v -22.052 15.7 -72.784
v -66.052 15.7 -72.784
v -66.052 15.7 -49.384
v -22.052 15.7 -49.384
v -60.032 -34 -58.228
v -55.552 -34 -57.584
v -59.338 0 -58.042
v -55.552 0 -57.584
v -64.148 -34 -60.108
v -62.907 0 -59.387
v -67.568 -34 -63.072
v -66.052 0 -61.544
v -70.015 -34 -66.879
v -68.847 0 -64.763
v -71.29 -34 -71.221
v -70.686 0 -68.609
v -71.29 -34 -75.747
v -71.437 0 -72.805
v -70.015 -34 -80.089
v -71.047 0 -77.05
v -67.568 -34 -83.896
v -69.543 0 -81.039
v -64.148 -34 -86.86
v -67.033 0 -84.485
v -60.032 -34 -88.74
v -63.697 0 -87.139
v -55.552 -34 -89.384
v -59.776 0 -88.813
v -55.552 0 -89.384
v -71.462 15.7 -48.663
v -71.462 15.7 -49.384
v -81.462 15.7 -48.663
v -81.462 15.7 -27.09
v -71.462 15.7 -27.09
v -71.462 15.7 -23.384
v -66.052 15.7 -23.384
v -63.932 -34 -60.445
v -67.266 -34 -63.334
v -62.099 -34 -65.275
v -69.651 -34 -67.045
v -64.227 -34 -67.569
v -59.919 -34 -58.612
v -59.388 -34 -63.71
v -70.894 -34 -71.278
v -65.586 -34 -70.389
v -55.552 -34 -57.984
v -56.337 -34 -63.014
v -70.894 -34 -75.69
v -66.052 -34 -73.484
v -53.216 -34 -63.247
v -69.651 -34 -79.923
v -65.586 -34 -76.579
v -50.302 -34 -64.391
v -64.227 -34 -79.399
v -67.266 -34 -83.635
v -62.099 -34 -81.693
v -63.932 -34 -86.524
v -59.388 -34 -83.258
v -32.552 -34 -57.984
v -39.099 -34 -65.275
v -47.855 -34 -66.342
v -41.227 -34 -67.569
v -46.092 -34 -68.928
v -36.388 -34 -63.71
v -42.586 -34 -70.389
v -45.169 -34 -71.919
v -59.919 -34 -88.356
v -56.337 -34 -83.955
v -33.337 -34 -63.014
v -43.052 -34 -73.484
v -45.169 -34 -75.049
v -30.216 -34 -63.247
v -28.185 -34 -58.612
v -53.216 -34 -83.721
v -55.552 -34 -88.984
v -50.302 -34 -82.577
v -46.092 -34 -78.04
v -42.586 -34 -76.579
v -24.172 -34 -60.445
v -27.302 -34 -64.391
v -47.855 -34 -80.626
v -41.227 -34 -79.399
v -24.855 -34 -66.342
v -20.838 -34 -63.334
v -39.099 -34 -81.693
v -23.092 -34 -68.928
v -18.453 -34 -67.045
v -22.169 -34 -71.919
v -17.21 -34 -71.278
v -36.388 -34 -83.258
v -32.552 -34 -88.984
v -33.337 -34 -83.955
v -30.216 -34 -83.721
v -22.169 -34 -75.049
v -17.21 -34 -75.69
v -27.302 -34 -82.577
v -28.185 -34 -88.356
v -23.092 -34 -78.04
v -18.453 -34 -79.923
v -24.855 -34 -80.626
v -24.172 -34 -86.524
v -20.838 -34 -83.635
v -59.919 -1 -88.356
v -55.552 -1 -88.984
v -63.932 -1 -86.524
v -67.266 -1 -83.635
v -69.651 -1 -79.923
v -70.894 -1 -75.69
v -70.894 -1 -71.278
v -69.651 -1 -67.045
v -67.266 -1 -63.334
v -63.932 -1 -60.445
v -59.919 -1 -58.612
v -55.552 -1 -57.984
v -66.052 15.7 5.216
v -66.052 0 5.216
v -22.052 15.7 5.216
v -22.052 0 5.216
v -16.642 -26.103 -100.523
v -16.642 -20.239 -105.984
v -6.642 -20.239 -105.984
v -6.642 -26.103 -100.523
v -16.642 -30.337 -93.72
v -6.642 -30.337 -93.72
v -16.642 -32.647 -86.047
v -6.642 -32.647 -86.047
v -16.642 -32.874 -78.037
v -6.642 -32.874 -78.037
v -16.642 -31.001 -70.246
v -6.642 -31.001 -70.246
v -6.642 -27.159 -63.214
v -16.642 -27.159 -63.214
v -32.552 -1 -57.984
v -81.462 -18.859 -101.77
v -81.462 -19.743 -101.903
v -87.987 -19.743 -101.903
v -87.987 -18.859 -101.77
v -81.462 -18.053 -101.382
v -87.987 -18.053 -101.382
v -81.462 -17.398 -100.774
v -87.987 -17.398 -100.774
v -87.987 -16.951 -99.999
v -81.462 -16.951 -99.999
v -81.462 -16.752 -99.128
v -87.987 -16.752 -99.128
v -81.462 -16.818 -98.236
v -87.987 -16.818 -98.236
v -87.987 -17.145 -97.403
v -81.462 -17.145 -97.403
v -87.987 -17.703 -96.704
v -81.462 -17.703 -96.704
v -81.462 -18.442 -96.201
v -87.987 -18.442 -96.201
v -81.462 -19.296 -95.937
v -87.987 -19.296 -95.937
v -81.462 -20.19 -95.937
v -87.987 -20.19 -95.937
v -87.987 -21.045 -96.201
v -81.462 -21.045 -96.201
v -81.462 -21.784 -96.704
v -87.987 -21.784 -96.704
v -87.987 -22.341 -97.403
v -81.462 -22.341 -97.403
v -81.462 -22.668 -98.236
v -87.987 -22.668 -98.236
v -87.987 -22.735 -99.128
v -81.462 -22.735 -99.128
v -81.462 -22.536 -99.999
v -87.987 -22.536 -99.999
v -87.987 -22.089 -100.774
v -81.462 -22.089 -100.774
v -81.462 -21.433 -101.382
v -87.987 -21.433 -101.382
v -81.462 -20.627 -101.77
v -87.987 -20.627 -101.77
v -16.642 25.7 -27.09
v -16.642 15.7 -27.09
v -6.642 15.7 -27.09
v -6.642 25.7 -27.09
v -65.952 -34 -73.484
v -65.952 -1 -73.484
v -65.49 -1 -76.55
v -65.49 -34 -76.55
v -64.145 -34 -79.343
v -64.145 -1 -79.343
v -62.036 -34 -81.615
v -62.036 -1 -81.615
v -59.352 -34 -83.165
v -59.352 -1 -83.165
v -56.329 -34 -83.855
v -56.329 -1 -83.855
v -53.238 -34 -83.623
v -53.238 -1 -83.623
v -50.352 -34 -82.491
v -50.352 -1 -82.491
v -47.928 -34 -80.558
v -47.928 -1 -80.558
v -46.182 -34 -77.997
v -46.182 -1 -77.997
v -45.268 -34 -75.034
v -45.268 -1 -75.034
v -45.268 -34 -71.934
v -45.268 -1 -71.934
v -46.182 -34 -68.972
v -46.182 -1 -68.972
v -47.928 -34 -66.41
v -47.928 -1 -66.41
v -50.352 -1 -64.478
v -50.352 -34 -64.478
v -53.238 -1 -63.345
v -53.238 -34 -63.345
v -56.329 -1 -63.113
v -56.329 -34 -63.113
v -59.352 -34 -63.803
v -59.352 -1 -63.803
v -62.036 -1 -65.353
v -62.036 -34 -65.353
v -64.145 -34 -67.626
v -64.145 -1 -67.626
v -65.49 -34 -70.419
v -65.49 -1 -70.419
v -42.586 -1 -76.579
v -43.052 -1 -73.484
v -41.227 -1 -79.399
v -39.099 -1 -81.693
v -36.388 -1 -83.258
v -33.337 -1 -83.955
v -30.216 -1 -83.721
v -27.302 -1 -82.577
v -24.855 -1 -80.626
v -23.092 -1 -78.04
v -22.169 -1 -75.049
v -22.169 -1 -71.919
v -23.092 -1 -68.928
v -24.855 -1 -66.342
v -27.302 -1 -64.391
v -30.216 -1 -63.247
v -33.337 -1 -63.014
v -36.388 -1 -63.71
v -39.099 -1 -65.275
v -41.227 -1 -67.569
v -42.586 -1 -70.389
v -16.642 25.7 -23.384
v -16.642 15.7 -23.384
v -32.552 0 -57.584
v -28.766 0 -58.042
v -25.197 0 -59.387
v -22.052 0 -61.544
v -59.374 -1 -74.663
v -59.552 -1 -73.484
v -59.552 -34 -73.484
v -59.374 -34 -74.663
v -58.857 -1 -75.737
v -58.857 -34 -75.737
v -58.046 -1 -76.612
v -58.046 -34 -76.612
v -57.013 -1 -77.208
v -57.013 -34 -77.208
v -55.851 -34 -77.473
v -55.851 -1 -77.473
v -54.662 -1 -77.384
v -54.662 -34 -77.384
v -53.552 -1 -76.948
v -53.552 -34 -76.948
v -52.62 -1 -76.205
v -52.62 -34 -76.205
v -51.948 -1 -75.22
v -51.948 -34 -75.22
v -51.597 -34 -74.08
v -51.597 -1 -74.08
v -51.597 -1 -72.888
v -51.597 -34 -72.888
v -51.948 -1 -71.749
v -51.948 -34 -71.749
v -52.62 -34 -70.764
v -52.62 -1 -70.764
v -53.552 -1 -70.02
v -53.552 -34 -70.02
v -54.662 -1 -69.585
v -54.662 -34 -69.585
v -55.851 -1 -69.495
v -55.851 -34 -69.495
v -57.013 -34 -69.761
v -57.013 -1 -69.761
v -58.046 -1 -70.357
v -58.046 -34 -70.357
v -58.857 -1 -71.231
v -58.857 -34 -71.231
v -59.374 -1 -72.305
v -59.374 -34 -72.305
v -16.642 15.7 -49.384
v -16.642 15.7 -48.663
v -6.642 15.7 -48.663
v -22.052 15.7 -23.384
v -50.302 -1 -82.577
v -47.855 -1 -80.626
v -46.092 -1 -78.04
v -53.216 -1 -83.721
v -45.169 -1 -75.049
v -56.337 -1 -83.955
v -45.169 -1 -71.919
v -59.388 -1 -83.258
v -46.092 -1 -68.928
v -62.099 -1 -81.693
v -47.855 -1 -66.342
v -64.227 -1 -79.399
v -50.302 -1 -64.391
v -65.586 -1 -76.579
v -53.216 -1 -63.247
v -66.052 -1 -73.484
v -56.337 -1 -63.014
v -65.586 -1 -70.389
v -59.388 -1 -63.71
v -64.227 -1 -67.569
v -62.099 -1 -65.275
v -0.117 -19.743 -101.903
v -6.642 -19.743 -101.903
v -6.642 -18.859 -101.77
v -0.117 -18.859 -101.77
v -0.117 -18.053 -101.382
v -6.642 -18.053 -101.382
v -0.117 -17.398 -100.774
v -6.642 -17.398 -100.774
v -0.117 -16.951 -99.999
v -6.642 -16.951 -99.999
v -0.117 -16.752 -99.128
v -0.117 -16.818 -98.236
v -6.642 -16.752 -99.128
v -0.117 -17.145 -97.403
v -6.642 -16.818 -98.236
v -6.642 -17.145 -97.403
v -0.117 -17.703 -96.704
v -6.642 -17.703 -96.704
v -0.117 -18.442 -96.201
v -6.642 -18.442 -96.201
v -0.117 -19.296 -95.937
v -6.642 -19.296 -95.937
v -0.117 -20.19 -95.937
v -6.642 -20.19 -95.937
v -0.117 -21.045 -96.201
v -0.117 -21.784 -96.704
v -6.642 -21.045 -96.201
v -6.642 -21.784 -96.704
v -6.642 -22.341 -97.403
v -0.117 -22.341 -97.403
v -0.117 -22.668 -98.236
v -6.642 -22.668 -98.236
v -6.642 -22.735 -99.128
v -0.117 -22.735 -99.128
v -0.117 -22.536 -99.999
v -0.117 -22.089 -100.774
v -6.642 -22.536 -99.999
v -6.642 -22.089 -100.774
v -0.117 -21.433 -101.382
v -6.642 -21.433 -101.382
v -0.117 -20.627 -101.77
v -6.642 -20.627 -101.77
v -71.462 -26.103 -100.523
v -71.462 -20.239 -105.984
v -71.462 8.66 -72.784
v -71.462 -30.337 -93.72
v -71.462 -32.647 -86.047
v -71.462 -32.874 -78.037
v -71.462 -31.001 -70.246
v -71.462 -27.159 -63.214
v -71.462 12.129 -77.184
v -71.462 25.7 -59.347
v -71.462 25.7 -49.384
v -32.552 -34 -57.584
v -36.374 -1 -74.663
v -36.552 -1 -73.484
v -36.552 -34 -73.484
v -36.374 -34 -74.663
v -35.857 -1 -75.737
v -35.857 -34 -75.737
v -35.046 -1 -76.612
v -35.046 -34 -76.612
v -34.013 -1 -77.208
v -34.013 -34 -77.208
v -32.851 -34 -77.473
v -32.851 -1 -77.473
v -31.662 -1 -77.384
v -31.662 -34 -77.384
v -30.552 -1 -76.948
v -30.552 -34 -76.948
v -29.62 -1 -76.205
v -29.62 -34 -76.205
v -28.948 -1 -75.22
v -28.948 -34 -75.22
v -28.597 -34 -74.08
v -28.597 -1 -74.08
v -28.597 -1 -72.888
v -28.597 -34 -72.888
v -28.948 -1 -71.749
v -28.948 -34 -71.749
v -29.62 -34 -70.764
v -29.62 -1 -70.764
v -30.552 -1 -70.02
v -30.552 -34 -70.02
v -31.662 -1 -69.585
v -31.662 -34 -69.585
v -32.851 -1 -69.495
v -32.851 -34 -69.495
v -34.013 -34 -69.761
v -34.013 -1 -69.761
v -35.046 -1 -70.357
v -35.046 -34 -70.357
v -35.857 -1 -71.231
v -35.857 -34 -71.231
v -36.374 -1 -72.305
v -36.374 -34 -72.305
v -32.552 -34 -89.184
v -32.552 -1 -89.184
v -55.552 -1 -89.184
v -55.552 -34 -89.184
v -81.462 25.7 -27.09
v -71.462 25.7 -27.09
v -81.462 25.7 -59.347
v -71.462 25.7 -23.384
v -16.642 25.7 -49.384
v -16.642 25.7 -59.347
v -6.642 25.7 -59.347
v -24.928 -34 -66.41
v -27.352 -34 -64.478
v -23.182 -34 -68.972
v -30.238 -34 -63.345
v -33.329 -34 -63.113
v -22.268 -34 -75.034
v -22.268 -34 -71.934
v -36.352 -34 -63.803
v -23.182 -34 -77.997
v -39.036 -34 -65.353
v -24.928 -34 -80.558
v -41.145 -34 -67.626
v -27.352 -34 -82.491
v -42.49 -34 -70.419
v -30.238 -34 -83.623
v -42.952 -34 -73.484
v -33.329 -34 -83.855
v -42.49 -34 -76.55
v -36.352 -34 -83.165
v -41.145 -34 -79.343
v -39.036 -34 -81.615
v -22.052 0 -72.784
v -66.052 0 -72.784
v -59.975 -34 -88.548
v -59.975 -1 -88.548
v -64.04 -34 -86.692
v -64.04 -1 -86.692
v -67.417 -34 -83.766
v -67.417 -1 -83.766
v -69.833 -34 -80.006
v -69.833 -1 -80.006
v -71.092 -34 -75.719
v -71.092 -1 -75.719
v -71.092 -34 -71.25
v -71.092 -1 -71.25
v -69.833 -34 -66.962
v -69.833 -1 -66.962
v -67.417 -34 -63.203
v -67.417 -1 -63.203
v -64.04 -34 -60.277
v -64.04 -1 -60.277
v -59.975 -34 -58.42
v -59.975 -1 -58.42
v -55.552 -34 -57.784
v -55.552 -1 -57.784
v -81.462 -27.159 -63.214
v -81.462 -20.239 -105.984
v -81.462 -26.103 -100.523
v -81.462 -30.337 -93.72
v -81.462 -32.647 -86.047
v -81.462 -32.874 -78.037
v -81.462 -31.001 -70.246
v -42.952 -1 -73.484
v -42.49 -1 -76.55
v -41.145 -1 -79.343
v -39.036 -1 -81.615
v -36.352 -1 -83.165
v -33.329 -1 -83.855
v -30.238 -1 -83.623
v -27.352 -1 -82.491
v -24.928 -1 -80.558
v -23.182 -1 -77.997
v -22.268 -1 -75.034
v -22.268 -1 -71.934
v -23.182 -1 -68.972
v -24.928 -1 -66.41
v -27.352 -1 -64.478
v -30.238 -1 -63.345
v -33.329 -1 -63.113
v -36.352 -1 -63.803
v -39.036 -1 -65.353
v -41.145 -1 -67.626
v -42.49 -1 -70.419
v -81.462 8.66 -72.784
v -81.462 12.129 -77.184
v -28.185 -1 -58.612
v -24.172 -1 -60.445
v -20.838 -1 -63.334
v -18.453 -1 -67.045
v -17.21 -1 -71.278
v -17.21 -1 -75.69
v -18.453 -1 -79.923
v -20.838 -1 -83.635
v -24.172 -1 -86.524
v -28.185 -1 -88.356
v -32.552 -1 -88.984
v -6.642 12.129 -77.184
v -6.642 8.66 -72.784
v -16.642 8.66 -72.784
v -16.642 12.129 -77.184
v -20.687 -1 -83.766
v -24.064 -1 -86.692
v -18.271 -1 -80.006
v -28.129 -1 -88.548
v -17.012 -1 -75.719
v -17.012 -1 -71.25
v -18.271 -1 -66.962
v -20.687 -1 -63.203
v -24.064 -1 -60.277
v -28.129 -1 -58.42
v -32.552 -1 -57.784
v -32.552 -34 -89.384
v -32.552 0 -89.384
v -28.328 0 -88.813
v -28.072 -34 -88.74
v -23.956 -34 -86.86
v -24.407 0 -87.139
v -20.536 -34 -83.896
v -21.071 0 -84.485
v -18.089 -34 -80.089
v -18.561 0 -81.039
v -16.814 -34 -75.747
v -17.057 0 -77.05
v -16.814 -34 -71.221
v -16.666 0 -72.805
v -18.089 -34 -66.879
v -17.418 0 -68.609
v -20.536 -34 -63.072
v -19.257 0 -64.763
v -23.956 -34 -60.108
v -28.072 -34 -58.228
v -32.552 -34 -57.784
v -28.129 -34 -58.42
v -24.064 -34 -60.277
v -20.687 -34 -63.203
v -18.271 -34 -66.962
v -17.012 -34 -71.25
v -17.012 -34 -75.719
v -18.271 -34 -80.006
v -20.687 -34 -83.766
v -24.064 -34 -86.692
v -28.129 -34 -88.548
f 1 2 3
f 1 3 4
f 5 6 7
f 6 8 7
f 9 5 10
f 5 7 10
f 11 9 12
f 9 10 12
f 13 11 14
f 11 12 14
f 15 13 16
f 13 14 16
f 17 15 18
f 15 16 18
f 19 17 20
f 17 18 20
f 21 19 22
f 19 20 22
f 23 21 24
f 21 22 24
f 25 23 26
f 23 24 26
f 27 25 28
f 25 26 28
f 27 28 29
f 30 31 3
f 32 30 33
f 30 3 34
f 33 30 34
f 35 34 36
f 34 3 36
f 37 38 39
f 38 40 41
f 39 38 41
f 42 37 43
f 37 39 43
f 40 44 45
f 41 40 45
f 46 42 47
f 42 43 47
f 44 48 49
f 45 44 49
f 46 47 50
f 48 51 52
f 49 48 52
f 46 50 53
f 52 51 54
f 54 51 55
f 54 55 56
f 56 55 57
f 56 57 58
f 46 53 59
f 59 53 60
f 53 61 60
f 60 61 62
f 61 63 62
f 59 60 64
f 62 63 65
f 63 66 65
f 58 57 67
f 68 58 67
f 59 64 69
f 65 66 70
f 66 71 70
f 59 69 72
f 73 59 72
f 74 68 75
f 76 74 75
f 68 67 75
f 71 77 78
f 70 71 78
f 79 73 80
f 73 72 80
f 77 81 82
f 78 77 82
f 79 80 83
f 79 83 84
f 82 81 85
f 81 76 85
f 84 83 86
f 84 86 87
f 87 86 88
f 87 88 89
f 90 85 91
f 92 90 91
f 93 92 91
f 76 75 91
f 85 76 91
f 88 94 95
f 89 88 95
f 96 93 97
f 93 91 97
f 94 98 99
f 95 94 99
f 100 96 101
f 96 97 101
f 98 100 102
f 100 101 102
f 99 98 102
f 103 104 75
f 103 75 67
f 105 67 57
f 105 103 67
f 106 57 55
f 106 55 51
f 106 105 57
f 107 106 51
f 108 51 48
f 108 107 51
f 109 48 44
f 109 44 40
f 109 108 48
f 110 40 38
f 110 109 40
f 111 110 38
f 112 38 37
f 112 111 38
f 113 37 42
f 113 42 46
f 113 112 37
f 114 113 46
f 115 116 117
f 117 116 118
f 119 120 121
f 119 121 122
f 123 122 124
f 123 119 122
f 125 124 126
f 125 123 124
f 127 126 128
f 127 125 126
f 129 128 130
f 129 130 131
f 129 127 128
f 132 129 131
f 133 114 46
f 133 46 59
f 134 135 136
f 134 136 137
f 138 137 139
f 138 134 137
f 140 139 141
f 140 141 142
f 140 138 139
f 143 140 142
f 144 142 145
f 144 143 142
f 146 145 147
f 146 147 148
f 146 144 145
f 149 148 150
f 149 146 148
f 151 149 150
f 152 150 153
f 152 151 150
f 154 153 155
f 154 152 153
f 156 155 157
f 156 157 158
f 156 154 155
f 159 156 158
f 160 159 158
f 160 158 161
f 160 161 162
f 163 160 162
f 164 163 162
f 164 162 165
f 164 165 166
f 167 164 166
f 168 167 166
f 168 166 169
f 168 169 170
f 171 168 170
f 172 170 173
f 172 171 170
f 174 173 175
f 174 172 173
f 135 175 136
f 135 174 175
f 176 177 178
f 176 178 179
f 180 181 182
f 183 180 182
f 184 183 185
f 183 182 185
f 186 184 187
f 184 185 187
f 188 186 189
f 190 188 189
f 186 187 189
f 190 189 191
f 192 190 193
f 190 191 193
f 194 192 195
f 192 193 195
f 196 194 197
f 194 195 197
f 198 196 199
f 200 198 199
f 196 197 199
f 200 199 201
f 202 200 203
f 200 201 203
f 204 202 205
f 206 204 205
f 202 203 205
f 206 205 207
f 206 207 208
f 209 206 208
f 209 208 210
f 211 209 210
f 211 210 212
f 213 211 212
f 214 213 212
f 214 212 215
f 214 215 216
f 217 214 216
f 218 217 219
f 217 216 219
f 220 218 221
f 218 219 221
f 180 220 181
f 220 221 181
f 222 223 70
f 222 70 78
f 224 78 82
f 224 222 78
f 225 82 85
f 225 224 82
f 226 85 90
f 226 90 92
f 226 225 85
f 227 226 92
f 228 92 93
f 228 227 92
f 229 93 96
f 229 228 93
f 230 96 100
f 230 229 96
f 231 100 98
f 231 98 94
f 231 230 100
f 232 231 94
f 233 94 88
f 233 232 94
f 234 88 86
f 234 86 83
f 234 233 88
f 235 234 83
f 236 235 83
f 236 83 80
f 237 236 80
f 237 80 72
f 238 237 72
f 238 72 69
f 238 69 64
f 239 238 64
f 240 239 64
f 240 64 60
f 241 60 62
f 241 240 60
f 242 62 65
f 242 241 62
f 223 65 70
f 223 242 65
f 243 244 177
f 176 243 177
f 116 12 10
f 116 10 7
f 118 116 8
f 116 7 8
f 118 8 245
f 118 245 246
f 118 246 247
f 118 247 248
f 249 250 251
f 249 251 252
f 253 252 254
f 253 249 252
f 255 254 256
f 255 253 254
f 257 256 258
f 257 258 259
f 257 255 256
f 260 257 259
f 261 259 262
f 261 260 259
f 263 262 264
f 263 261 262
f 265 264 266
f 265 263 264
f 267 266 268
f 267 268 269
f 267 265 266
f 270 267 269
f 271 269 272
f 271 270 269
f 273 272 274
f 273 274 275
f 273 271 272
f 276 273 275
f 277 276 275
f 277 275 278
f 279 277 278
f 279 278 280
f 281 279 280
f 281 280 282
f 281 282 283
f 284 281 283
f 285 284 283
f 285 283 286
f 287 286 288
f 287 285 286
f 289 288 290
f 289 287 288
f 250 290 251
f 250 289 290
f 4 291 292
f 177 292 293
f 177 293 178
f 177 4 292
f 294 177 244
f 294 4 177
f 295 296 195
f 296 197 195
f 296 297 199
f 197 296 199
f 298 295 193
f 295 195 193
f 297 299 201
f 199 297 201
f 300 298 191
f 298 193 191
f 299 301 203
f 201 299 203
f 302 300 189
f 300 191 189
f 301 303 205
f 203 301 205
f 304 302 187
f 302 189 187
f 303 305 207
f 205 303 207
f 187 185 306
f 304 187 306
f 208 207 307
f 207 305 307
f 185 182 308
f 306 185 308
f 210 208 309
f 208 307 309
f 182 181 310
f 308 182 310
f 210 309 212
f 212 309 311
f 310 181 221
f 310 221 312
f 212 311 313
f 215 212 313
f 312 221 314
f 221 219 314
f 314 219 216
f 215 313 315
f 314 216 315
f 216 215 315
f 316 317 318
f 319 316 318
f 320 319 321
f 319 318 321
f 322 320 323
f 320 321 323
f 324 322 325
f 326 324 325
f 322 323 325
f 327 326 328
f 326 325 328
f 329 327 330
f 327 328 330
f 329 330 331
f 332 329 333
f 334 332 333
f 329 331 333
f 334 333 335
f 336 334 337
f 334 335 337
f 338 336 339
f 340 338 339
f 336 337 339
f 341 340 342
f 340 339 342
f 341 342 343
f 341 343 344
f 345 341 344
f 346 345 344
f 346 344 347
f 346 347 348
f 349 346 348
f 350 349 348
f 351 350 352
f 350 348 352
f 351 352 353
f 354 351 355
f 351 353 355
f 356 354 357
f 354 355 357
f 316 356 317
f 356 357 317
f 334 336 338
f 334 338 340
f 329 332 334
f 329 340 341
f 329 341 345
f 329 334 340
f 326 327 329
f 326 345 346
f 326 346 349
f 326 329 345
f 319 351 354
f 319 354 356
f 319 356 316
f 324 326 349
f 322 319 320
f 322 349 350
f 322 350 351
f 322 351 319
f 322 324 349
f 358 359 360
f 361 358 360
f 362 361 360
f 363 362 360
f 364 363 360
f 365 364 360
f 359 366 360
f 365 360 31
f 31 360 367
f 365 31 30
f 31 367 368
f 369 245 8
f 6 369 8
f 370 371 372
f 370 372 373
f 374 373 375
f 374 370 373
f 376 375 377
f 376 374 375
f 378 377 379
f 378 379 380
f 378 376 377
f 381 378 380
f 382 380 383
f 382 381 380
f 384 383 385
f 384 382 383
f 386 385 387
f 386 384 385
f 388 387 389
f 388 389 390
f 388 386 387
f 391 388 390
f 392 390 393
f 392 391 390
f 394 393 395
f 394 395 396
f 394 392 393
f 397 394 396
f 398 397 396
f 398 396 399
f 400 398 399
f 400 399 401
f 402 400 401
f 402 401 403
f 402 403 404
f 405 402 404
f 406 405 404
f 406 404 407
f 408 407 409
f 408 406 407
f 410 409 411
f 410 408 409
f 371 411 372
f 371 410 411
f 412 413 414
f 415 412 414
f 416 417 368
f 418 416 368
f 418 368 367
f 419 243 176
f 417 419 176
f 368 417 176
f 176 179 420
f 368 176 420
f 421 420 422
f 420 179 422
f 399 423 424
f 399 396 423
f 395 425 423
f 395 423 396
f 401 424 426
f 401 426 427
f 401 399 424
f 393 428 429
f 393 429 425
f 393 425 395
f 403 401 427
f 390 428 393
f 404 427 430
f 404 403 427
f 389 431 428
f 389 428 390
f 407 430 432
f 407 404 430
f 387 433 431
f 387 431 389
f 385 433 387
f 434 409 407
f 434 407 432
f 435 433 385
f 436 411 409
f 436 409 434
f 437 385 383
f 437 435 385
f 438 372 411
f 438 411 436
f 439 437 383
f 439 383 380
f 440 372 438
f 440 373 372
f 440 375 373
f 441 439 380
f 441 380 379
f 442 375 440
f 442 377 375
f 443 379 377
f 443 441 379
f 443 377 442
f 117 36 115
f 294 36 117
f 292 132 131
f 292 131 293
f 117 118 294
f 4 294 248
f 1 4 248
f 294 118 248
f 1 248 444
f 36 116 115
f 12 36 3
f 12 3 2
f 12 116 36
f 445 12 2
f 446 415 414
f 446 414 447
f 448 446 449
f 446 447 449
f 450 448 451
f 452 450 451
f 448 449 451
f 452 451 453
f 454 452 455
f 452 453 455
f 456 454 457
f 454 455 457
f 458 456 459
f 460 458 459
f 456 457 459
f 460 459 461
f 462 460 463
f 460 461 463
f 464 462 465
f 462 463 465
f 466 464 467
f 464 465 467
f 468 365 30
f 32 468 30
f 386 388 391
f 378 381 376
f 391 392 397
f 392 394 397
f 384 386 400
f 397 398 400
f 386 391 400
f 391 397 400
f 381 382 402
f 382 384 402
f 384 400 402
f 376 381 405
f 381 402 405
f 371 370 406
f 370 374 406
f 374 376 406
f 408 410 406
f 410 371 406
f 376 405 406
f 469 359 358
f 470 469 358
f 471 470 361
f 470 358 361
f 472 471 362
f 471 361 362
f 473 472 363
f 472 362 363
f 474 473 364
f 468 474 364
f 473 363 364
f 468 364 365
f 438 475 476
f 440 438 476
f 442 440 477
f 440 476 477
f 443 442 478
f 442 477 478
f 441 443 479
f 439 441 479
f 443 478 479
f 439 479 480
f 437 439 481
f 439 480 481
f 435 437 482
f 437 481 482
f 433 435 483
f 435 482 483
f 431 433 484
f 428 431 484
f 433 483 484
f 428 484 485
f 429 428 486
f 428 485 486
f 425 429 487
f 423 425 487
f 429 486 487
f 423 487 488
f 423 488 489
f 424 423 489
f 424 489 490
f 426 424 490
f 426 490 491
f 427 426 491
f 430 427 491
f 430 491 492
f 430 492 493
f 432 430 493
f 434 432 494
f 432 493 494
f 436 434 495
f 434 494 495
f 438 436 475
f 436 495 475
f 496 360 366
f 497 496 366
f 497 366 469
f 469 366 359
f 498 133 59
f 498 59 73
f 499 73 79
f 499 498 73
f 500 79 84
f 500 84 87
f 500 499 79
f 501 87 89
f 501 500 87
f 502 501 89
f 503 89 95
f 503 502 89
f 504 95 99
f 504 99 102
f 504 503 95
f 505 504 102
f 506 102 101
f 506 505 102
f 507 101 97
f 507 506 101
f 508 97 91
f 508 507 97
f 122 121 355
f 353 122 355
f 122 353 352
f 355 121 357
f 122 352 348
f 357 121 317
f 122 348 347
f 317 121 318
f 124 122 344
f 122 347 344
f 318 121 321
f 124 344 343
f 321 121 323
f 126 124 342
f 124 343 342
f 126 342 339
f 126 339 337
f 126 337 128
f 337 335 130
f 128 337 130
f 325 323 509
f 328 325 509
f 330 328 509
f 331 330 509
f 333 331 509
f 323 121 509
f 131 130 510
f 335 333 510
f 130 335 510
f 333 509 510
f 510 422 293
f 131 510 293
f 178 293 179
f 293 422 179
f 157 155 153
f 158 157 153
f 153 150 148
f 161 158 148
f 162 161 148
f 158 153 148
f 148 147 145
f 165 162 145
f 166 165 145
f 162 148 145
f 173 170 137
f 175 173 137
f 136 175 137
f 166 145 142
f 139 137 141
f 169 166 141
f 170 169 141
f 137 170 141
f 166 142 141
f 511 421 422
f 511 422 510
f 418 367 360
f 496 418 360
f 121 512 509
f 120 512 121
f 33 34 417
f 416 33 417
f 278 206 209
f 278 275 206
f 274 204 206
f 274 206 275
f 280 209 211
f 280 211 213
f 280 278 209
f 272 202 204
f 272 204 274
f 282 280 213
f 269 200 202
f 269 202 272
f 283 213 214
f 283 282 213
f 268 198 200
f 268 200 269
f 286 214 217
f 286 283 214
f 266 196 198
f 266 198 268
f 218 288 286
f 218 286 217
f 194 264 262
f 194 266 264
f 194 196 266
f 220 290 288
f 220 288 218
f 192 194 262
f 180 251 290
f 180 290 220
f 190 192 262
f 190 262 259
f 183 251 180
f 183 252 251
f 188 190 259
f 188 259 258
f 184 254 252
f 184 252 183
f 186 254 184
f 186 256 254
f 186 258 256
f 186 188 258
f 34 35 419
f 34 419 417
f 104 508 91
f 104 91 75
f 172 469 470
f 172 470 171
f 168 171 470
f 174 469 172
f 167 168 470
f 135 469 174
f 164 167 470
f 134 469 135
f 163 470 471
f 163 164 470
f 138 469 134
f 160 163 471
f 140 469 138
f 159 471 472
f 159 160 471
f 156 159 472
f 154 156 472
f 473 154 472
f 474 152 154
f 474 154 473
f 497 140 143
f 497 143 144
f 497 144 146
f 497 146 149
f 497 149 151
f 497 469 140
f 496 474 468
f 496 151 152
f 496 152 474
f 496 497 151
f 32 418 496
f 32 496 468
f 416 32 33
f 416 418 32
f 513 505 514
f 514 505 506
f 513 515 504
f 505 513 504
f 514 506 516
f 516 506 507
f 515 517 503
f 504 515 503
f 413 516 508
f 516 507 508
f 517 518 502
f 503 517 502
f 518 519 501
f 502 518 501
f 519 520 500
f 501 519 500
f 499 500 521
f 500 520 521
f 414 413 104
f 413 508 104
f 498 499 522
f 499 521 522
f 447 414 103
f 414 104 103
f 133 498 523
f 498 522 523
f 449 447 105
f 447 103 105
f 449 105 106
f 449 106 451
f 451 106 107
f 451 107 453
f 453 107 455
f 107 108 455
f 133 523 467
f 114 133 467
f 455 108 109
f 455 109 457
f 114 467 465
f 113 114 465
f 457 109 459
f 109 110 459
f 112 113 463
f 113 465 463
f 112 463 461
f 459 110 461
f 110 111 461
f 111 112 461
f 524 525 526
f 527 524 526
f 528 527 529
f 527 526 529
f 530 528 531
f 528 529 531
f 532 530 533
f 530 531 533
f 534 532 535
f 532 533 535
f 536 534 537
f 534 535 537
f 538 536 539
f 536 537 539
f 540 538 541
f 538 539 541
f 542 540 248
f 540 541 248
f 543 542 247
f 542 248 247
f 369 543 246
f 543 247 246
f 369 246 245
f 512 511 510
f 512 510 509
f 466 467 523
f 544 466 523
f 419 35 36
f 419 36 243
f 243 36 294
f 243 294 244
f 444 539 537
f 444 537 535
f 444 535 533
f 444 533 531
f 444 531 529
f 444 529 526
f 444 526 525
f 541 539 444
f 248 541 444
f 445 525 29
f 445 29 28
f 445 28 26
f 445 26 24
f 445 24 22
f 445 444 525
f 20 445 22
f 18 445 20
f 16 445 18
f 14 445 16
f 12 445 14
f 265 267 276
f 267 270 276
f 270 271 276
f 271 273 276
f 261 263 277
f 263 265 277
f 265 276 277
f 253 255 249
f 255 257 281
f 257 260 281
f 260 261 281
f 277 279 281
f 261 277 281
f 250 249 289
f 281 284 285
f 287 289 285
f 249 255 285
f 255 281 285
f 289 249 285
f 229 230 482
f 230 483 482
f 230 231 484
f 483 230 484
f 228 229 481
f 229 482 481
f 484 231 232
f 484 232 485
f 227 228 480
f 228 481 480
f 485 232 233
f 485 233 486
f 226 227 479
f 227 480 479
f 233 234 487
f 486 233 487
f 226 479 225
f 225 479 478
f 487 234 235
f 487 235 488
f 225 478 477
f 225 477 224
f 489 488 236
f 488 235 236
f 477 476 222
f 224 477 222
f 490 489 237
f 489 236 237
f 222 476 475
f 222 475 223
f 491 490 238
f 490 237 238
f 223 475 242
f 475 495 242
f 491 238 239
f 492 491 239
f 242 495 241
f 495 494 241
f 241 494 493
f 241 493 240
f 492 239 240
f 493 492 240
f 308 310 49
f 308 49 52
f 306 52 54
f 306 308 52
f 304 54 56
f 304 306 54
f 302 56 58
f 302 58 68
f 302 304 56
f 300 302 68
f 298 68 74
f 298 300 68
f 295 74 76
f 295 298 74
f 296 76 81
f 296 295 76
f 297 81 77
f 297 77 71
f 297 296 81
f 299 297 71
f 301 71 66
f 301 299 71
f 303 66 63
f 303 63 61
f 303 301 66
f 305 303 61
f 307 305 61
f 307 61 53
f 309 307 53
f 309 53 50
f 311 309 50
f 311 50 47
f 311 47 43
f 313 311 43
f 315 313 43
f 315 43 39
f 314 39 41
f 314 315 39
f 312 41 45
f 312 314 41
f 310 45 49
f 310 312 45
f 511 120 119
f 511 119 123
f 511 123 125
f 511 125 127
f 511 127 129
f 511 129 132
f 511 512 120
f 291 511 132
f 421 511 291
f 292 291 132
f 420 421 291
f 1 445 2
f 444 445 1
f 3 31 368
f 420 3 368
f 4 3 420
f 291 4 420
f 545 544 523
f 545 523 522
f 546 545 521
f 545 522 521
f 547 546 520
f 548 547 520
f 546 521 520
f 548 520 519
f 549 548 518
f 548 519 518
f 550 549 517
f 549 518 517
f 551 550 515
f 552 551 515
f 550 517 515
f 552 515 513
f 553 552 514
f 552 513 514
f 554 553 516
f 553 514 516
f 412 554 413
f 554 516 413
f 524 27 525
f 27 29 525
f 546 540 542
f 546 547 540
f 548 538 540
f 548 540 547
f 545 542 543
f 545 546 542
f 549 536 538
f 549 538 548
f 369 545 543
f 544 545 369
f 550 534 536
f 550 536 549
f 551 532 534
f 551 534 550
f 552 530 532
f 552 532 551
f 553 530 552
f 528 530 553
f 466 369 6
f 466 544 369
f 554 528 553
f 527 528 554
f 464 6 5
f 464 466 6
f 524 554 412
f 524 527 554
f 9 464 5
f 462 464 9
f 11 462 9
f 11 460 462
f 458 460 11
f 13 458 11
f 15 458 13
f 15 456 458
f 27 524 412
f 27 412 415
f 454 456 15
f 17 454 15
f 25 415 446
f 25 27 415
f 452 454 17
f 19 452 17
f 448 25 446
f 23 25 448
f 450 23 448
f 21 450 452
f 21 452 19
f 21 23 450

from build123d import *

# Parameters (mm, degrees)
SZKIC1_W                     = 44
SZKIC1_H                     = 78
DODANIE_WYCI_GNI_CIE1_DEPTH  = 15.7
SZKIC2_W                     = 54.82
SZKIC2_H                     = 26
DODANIE_WYCI_GNI_CIE2_DEPTH  = 10
DODANIE_WYCI_GNI_CIE3_DEPTH  = 1
SZKIC6_R                     = 10.4
SZKIC6_R_2                   = 4
DODANIE_WYCI_GNI_CIE4_DEPTH  = 33
SZKIC7_R                     = 10.5
DODANIE_WYCI_GNI_CIE5_DEPTH  = 33
DODANIE_WYCI_GNI_CIE6_DEPTH  = 33
DODANIE_WYCI_GNI_CIE22_DEPTH = 10
SZKIC15_R                    = 3
DODANIE_WYCI_GNI_CIE23_DEPTH = 6.525


with BuildPart() as part:
    # Szkic1 → Dodanie-wyciągnięcie1 (new body)
    with BuildSketch(Plane(origin=(0, 0, 0), x_dir=(1, 0, 0), z_dir=(0, 1, 0))):
        with Locations((-44.05199022, 33.7842123)):
            Rectangle(SZKIC1_W, SZKIC1_H)
    extrude(amount=DODANIE_WYCI_GNI_CIE1_DEPTH)

    # Szkic2 → Dodanie-wyciągnięcie2 (add)
    with BuildSketch(Plane(origin=(0, 15.7, 0), x_dir=(1, 0, 0), z_dir=(0, 1, 0))):
        with Locations((-44.05199022, 36.3842123)):
            Rectangle(SZKIC2_W, SZKIC2_H)
    extrude(amount=DODANIE_WYCI_GNI_CIE2_DEPTH)

    # Szkic3 → Dodanie-wyciągnięcie3 (add)
    with BuildSketch(Plane.XZ):
        with BuildLine():
            Line((-32.55199022, -89.3842123), (-55.55199022, -89.3842123))
            ThreePointArc((-55.55199022, -89.3842123), (-71.45199022, -73.4842123), (-55.55199022, -57.5842123))
            Line((-55.55199022, -57.5842123), (-32.55199022, -57.5842123))
            ThreePointArc((-32.55199022, -57.5842123), (-16.65199022, -73.4842123), (-32.55199022, -89.3842123))
        make_face()
    extrude(amount=DODANIE_WYCI_GNI_CIE3_DEPTH)

    # Szkic6 → Dodanie-wyciągnięcie4 (add)
    with BuildSketch(Plane(origin=(0, -1, 0), x_dir=(-1, 0, 0), z_dir=(0, -1, 0))):
        with Locations((32.55199022, 73.4842123)):
            Circle(SZKIC6_R)
        with Locations((32.55199022, 73.4842123)):
            Circle(SZKIC6_R_2, mode=Mode.SUBTRACT)
        with Locations((55.55199022, 73.4842123)):
            Circle(SZKIC6_R)
        with Locations((55.55199022, 73.4842123)):
            Circle(SZKIC6_R_2, mode=Mode.SUBTRACT)
    extrude(amount=DODANIE_WYCI_GNI_CIE4_DEPTH)

    # Szkic7 → Dodanie-wyciągnięcie5 (add)
    with BuildSketch(Plane(origin=(0, -1, 0), x_dir=(-1, 0, 0), z_dir=(0, -1, 0))):
        with BuildLine():
            Line((55.55199022, 57.9842123), (32.55199022, 57.9842123))
            ThreePointArc((32.55199022, 57.9842123), (17.05199022, 73.4842123), (32.55199022, 88.9842123))
            Line((32.55199022, 88.9842123), (55.55199022, 88.9842123))
            ThreePointArc((55.55199022, 88.9842123), (71.05199022, 73.4842123), (55.55199022, 57.9842123))
        make_face()
        with Locations((55.55199022, 73.4842123)):
            Circle(SZKIC7_R, mode=Mode.SUBTRACT)
        with Locations((32.55199022, 73.4842123)):
            Circle(SZKIC7_R, mode=Mode.SUBTRACT)
    extrude(amount=DODANIE_WYCI_GNI_CIE5_DEPTH)

    # Szkic8 → Dodanie-wyciągnięcie6 (add)
    with BuildSketch(Plane(origin=(0, -1, 0), x_dir=(-1, 0, 0), z_dir=(0, -1, 0))):
        with BuildLine():
            Line((32.55199022, 57.5842123), (55.55199022, 57.5842123))
            ThreePointArc((55.55199022, 57.5842123), (71.45199022, 73.4842123), (55.55199022, 89.3842123))
            Line((55.55199022, 89.3842123), (32.55199022, 89.3842123))
            ThreePointArc((32.55199022, 89.3842123), (16.65199022, 73.4842123), (32.55199022, 57.5842123))
        make_face()
        with BuildLine():
            Line((55.55199022, 57.7842123), (32.55199022, 57.7842123))
            ThreePointArc((32.55199022, 57.7842123), (16.85199022, 73.4842123), (32.55199022, 89.1842123))
            Line((32.55199022, 89.1842123), (55.55199022, 89.1842123))
            ThreePointArc((55.55199022, 89.1842123), (71.25199022, 73.4842123), (55.55199022, 57.7842123))
        make_face(mode=Mode.SUBTRACT)
    extrude(amount=DODANIE_WYCI_GNI_CIE6_DEPTH)

    # Szkic13 → Dodanie-wyciągnięcie22 (add)
    with BuildSketch(Plane(origin=(-16.64199022, 0, 0), x_dir=(0, 0, -1), z_dir=(1, 0, 0))):
        with BuildLine():
            Line((63.214194972, -27.158978782), (48.662895357, 15.7))
            Line((48.662895357, 15.7), (27.090339285, 15.7))
            Line((27.090339285, 15.7), (27.090339285, 25.7))
            Line((27.090339285, 25.7), (59.347416053, 25.7))
            Line((59.347416053, 25.7), (72.7842123, 8.659604885))
            Line((72.7842123, 8.659604885), (77.184359271, 12.129235601))
            Line((77.184359271, 12.129235601), (105.9842123, -20.239479664))
            ThreePointArc((105.9842123, -20.239479664), (86.046845732, -32.647229139), (63.214194972, -27.158978782))
        make_face()
    dodanie_wyci_gni_cie22 = extrude(amount=DODANIE_WYCI_GNI_CIE22_DEPTH)

    # Lustro2: Dodanie-wyciągnięcie22 across plane
    add(dodanie_wyci_gni_cie22.mirror(Plane(origin=(-44.05199022, 0, 0), x_dir=(0, 0, 1), z_dir=(1, 0, 0))))

    # Szkic15 → Dodanie-wyciągnięcie23 (add)
    with BuildSketch(Plane(origin=(-6.64199022, 0, 0), x_dir=(0, 0, -1), z_dir=(1, 0, 0))):
        with Locations((98.903450656, -19.74322341)):
            Circle(SZKIC15_R)
    dodanie_wyci_gni_cie23 = extrude(amount=DODANIE_WYCI_GNI_CIE23_DEPTH)

    # Lustro3: Dodanie-wyciągnięcie23 across plane
    add(dodanie_wyci_gni_cie23.mirror(Plane(origin=(-44.05199022, 0, 0), x_dir=(0, 0, 1), z_dir=(1, 0, 0))))


solid = part.part
